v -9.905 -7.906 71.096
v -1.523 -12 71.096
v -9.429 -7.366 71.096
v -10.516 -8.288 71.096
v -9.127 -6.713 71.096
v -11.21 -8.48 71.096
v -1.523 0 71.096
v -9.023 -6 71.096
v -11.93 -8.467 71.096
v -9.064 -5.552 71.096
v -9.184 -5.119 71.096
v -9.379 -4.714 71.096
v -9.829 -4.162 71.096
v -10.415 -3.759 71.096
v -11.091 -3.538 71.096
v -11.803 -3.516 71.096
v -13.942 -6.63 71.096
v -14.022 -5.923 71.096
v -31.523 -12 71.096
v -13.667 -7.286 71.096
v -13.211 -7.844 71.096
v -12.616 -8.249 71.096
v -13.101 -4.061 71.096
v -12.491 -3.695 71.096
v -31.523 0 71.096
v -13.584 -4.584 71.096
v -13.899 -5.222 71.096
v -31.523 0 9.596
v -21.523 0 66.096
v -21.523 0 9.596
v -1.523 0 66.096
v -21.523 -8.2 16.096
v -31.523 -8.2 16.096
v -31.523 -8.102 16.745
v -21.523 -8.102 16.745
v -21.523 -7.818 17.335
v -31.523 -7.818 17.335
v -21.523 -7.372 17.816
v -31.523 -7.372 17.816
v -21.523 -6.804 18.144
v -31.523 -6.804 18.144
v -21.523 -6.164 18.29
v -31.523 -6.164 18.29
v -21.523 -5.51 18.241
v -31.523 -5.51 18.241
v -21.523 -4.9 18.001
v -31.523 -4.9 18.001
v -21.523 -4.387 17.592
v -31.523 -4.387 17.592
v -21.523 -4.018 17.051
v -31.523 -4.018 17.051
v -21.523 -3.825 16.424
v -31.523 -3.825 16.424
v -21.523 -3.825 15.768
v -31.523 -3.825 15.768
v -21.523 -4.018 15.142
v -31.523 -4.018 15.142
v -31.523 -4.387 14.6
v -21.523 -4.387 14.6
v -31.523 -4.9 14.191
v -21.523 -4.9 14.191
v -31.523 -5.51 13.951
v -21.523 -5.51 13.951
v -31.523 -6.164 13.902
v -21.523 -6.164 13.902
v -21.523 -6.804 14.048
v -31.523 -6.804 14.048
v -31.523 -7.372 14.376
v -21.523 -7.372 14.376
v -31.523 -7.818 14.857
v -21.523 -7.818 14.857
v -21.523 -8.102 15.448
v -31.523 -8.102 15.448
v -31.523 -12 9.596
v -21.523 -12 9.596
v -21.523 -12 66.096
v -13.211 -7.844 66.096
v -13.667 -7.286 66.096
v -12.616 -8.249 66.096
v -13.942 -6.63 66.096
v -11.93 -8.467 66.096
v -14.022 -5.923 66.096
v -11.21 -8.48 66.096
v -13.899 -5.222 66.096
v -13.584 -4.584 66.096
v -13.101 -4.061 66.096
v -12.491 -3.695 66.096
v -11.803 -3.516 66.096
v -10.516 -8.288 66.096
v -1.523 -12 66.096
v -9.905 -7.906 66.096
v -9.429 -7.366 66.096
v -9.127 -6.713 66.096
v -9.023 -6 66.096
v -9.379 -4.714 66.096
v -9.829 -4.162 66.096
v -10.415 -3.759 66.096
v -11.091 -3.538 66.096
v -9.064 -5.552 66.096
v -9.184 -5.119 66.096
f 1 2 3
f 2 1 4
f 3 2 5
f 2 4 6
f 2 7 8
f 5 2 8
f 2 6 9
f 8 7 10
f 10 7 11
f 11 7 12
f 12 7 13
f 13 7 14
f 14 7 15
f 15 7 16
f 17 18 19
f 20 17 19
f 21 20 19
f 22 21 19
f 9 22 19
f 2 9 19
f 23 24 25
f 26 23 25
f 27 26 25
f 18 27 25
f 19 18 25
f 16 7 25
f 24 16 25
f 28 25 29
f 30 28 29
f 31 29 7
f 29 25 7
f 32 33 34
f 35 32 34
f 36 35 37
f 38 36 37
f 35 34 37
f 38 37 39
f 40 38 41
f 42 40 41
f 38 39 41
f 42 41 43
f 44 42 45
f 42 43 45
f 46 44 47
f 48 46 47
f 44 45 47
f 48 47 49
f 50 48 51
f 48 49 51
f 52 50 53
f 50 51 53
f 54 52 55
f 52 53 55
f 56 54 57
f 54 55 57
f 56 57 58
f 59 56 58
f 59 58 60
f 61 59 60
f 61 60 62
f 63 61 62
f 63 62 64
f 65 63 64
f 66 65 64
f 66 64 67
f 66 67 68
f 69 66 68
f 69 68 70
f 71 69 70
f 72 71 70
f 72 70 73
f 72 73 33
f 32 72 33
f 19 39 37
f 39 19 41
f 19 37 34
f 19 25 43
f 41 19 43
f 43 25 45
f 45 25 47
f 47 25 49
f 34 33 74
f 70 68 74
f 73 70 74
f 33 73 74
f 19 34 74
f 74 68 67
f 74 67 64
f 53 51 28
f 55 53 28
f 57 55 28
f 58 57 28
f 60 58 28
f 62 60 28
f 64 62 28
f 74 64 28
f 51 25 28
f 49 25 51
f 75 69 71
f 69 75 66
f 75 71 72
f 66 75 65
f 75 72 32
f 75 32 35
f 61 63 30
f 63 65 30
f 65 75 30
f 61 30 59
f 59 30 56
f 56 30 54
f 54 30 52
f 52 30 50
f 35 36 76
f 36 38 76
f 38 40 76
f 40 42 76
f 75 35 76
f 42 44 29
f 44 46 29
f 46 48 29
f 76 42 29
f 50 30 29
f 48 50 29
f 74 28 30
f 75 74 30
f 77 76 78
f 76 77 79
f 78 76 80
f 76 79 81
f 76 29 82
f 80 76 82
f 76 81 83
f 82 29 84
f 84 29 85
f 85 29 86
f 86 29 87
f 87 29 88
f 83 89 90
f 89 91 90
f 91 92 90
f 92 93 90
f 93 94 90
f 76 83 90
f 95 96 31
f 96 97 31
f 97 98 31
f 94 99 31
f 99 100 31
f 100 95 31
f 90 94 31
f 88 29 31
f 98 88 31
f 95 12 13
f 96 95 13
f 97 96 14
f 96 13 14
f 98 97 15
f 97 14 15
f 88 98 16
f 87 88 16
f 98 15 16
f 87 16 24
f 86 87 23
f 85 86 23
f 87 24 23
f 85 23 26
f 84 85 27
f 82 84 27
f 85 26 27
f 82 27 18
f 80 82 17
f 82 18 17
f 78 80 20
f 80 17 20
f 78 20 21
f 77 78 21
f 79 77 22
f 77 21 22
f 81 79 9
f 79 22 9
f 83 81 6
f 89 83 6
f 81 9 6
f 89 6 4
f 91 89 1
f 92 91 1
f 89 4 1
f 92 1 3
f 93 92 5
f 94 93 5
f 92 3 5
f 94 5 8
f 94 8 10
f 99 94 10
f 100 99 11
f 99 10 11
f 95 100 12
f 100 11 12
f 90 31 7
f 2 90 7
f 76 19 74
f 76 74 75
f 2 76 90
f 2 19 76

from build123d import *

# Parameters (mm, degrees)
F1_DEPTH = 12
F3_DEPTH = 25
F5_DEPTH = 25


with BuildPart() as f1:
    # F0 (on Front) → F1 (new body)
    with BuildSketch(Plane.XZ):
        Polygon((-1.5231755376, 71.0960855484), (-31.5231755376, 71.0960855484), (-31.5231755376, 9.5960855484), (-21.5231755376, 9.5960855484), (-21.5231755376, 66.0960855484), (-1.5231755376, 66.0960855484), align=None)
    extrude(amount=F1_DEPTH)

    # F2 (on face) → F3 (cut)
    with BuildSketch(Plane(origin=(-31.5231755376, 0, 0), x_dir=(0, -1, 0), z_dir=(-1, 0, 0))):
        with BuildLine():
            ThreePointArc((3.8, 16.0960855484), (6, 13.8960855484), (8.2, 16.0960855484))
            Line((8.2, 16.0960855484), (3.8, 16.0960855484))
        make_face()
        with BuildLine():
            Line((3.8, 16.0960855484), (8.2, 16.0960855484))
            ThreePointArc((8.2, 16.0960855484), (6, 18.2960855484), (3.8, 16.0960855484))
        make_face()
    extrude(amount=-F3_DEPTH, mode=Mode.SUBTRACT)

    # F4 (on face) → F5 (cut)
    with BuildSketch(Plane.XY.offset(71.0960855484)):
        with BuildLine():
            ThreePointArc((-9.3794432233, -4.7137606114), (-12.8094149262, -3.8562676857), (-13.6669078519, -7.2862393886))
            Line((-13.6669078519, -7.2862393886), (-9.3794432233, -4.7137606114))
        make_face()
        with BuildLine():
            Line((-9.3794432233, -4.7137606114), (-13.6669078519, -7.2862393886))
            ThreePointArc((-13.6669078519, -7.2862393886), (-10.8558415828, -8.4092873205), (-9.0231755376, -6))
            ThreePointArc((-9.0231755376, -6), (-9.1138882171, -5.3326660453), (-9.3794432233, -4.7137606114))
        make_face()
    extrude(amount=-F5_DEPTH, mode=Mode.SUBTRACT)


solid = f1.part
